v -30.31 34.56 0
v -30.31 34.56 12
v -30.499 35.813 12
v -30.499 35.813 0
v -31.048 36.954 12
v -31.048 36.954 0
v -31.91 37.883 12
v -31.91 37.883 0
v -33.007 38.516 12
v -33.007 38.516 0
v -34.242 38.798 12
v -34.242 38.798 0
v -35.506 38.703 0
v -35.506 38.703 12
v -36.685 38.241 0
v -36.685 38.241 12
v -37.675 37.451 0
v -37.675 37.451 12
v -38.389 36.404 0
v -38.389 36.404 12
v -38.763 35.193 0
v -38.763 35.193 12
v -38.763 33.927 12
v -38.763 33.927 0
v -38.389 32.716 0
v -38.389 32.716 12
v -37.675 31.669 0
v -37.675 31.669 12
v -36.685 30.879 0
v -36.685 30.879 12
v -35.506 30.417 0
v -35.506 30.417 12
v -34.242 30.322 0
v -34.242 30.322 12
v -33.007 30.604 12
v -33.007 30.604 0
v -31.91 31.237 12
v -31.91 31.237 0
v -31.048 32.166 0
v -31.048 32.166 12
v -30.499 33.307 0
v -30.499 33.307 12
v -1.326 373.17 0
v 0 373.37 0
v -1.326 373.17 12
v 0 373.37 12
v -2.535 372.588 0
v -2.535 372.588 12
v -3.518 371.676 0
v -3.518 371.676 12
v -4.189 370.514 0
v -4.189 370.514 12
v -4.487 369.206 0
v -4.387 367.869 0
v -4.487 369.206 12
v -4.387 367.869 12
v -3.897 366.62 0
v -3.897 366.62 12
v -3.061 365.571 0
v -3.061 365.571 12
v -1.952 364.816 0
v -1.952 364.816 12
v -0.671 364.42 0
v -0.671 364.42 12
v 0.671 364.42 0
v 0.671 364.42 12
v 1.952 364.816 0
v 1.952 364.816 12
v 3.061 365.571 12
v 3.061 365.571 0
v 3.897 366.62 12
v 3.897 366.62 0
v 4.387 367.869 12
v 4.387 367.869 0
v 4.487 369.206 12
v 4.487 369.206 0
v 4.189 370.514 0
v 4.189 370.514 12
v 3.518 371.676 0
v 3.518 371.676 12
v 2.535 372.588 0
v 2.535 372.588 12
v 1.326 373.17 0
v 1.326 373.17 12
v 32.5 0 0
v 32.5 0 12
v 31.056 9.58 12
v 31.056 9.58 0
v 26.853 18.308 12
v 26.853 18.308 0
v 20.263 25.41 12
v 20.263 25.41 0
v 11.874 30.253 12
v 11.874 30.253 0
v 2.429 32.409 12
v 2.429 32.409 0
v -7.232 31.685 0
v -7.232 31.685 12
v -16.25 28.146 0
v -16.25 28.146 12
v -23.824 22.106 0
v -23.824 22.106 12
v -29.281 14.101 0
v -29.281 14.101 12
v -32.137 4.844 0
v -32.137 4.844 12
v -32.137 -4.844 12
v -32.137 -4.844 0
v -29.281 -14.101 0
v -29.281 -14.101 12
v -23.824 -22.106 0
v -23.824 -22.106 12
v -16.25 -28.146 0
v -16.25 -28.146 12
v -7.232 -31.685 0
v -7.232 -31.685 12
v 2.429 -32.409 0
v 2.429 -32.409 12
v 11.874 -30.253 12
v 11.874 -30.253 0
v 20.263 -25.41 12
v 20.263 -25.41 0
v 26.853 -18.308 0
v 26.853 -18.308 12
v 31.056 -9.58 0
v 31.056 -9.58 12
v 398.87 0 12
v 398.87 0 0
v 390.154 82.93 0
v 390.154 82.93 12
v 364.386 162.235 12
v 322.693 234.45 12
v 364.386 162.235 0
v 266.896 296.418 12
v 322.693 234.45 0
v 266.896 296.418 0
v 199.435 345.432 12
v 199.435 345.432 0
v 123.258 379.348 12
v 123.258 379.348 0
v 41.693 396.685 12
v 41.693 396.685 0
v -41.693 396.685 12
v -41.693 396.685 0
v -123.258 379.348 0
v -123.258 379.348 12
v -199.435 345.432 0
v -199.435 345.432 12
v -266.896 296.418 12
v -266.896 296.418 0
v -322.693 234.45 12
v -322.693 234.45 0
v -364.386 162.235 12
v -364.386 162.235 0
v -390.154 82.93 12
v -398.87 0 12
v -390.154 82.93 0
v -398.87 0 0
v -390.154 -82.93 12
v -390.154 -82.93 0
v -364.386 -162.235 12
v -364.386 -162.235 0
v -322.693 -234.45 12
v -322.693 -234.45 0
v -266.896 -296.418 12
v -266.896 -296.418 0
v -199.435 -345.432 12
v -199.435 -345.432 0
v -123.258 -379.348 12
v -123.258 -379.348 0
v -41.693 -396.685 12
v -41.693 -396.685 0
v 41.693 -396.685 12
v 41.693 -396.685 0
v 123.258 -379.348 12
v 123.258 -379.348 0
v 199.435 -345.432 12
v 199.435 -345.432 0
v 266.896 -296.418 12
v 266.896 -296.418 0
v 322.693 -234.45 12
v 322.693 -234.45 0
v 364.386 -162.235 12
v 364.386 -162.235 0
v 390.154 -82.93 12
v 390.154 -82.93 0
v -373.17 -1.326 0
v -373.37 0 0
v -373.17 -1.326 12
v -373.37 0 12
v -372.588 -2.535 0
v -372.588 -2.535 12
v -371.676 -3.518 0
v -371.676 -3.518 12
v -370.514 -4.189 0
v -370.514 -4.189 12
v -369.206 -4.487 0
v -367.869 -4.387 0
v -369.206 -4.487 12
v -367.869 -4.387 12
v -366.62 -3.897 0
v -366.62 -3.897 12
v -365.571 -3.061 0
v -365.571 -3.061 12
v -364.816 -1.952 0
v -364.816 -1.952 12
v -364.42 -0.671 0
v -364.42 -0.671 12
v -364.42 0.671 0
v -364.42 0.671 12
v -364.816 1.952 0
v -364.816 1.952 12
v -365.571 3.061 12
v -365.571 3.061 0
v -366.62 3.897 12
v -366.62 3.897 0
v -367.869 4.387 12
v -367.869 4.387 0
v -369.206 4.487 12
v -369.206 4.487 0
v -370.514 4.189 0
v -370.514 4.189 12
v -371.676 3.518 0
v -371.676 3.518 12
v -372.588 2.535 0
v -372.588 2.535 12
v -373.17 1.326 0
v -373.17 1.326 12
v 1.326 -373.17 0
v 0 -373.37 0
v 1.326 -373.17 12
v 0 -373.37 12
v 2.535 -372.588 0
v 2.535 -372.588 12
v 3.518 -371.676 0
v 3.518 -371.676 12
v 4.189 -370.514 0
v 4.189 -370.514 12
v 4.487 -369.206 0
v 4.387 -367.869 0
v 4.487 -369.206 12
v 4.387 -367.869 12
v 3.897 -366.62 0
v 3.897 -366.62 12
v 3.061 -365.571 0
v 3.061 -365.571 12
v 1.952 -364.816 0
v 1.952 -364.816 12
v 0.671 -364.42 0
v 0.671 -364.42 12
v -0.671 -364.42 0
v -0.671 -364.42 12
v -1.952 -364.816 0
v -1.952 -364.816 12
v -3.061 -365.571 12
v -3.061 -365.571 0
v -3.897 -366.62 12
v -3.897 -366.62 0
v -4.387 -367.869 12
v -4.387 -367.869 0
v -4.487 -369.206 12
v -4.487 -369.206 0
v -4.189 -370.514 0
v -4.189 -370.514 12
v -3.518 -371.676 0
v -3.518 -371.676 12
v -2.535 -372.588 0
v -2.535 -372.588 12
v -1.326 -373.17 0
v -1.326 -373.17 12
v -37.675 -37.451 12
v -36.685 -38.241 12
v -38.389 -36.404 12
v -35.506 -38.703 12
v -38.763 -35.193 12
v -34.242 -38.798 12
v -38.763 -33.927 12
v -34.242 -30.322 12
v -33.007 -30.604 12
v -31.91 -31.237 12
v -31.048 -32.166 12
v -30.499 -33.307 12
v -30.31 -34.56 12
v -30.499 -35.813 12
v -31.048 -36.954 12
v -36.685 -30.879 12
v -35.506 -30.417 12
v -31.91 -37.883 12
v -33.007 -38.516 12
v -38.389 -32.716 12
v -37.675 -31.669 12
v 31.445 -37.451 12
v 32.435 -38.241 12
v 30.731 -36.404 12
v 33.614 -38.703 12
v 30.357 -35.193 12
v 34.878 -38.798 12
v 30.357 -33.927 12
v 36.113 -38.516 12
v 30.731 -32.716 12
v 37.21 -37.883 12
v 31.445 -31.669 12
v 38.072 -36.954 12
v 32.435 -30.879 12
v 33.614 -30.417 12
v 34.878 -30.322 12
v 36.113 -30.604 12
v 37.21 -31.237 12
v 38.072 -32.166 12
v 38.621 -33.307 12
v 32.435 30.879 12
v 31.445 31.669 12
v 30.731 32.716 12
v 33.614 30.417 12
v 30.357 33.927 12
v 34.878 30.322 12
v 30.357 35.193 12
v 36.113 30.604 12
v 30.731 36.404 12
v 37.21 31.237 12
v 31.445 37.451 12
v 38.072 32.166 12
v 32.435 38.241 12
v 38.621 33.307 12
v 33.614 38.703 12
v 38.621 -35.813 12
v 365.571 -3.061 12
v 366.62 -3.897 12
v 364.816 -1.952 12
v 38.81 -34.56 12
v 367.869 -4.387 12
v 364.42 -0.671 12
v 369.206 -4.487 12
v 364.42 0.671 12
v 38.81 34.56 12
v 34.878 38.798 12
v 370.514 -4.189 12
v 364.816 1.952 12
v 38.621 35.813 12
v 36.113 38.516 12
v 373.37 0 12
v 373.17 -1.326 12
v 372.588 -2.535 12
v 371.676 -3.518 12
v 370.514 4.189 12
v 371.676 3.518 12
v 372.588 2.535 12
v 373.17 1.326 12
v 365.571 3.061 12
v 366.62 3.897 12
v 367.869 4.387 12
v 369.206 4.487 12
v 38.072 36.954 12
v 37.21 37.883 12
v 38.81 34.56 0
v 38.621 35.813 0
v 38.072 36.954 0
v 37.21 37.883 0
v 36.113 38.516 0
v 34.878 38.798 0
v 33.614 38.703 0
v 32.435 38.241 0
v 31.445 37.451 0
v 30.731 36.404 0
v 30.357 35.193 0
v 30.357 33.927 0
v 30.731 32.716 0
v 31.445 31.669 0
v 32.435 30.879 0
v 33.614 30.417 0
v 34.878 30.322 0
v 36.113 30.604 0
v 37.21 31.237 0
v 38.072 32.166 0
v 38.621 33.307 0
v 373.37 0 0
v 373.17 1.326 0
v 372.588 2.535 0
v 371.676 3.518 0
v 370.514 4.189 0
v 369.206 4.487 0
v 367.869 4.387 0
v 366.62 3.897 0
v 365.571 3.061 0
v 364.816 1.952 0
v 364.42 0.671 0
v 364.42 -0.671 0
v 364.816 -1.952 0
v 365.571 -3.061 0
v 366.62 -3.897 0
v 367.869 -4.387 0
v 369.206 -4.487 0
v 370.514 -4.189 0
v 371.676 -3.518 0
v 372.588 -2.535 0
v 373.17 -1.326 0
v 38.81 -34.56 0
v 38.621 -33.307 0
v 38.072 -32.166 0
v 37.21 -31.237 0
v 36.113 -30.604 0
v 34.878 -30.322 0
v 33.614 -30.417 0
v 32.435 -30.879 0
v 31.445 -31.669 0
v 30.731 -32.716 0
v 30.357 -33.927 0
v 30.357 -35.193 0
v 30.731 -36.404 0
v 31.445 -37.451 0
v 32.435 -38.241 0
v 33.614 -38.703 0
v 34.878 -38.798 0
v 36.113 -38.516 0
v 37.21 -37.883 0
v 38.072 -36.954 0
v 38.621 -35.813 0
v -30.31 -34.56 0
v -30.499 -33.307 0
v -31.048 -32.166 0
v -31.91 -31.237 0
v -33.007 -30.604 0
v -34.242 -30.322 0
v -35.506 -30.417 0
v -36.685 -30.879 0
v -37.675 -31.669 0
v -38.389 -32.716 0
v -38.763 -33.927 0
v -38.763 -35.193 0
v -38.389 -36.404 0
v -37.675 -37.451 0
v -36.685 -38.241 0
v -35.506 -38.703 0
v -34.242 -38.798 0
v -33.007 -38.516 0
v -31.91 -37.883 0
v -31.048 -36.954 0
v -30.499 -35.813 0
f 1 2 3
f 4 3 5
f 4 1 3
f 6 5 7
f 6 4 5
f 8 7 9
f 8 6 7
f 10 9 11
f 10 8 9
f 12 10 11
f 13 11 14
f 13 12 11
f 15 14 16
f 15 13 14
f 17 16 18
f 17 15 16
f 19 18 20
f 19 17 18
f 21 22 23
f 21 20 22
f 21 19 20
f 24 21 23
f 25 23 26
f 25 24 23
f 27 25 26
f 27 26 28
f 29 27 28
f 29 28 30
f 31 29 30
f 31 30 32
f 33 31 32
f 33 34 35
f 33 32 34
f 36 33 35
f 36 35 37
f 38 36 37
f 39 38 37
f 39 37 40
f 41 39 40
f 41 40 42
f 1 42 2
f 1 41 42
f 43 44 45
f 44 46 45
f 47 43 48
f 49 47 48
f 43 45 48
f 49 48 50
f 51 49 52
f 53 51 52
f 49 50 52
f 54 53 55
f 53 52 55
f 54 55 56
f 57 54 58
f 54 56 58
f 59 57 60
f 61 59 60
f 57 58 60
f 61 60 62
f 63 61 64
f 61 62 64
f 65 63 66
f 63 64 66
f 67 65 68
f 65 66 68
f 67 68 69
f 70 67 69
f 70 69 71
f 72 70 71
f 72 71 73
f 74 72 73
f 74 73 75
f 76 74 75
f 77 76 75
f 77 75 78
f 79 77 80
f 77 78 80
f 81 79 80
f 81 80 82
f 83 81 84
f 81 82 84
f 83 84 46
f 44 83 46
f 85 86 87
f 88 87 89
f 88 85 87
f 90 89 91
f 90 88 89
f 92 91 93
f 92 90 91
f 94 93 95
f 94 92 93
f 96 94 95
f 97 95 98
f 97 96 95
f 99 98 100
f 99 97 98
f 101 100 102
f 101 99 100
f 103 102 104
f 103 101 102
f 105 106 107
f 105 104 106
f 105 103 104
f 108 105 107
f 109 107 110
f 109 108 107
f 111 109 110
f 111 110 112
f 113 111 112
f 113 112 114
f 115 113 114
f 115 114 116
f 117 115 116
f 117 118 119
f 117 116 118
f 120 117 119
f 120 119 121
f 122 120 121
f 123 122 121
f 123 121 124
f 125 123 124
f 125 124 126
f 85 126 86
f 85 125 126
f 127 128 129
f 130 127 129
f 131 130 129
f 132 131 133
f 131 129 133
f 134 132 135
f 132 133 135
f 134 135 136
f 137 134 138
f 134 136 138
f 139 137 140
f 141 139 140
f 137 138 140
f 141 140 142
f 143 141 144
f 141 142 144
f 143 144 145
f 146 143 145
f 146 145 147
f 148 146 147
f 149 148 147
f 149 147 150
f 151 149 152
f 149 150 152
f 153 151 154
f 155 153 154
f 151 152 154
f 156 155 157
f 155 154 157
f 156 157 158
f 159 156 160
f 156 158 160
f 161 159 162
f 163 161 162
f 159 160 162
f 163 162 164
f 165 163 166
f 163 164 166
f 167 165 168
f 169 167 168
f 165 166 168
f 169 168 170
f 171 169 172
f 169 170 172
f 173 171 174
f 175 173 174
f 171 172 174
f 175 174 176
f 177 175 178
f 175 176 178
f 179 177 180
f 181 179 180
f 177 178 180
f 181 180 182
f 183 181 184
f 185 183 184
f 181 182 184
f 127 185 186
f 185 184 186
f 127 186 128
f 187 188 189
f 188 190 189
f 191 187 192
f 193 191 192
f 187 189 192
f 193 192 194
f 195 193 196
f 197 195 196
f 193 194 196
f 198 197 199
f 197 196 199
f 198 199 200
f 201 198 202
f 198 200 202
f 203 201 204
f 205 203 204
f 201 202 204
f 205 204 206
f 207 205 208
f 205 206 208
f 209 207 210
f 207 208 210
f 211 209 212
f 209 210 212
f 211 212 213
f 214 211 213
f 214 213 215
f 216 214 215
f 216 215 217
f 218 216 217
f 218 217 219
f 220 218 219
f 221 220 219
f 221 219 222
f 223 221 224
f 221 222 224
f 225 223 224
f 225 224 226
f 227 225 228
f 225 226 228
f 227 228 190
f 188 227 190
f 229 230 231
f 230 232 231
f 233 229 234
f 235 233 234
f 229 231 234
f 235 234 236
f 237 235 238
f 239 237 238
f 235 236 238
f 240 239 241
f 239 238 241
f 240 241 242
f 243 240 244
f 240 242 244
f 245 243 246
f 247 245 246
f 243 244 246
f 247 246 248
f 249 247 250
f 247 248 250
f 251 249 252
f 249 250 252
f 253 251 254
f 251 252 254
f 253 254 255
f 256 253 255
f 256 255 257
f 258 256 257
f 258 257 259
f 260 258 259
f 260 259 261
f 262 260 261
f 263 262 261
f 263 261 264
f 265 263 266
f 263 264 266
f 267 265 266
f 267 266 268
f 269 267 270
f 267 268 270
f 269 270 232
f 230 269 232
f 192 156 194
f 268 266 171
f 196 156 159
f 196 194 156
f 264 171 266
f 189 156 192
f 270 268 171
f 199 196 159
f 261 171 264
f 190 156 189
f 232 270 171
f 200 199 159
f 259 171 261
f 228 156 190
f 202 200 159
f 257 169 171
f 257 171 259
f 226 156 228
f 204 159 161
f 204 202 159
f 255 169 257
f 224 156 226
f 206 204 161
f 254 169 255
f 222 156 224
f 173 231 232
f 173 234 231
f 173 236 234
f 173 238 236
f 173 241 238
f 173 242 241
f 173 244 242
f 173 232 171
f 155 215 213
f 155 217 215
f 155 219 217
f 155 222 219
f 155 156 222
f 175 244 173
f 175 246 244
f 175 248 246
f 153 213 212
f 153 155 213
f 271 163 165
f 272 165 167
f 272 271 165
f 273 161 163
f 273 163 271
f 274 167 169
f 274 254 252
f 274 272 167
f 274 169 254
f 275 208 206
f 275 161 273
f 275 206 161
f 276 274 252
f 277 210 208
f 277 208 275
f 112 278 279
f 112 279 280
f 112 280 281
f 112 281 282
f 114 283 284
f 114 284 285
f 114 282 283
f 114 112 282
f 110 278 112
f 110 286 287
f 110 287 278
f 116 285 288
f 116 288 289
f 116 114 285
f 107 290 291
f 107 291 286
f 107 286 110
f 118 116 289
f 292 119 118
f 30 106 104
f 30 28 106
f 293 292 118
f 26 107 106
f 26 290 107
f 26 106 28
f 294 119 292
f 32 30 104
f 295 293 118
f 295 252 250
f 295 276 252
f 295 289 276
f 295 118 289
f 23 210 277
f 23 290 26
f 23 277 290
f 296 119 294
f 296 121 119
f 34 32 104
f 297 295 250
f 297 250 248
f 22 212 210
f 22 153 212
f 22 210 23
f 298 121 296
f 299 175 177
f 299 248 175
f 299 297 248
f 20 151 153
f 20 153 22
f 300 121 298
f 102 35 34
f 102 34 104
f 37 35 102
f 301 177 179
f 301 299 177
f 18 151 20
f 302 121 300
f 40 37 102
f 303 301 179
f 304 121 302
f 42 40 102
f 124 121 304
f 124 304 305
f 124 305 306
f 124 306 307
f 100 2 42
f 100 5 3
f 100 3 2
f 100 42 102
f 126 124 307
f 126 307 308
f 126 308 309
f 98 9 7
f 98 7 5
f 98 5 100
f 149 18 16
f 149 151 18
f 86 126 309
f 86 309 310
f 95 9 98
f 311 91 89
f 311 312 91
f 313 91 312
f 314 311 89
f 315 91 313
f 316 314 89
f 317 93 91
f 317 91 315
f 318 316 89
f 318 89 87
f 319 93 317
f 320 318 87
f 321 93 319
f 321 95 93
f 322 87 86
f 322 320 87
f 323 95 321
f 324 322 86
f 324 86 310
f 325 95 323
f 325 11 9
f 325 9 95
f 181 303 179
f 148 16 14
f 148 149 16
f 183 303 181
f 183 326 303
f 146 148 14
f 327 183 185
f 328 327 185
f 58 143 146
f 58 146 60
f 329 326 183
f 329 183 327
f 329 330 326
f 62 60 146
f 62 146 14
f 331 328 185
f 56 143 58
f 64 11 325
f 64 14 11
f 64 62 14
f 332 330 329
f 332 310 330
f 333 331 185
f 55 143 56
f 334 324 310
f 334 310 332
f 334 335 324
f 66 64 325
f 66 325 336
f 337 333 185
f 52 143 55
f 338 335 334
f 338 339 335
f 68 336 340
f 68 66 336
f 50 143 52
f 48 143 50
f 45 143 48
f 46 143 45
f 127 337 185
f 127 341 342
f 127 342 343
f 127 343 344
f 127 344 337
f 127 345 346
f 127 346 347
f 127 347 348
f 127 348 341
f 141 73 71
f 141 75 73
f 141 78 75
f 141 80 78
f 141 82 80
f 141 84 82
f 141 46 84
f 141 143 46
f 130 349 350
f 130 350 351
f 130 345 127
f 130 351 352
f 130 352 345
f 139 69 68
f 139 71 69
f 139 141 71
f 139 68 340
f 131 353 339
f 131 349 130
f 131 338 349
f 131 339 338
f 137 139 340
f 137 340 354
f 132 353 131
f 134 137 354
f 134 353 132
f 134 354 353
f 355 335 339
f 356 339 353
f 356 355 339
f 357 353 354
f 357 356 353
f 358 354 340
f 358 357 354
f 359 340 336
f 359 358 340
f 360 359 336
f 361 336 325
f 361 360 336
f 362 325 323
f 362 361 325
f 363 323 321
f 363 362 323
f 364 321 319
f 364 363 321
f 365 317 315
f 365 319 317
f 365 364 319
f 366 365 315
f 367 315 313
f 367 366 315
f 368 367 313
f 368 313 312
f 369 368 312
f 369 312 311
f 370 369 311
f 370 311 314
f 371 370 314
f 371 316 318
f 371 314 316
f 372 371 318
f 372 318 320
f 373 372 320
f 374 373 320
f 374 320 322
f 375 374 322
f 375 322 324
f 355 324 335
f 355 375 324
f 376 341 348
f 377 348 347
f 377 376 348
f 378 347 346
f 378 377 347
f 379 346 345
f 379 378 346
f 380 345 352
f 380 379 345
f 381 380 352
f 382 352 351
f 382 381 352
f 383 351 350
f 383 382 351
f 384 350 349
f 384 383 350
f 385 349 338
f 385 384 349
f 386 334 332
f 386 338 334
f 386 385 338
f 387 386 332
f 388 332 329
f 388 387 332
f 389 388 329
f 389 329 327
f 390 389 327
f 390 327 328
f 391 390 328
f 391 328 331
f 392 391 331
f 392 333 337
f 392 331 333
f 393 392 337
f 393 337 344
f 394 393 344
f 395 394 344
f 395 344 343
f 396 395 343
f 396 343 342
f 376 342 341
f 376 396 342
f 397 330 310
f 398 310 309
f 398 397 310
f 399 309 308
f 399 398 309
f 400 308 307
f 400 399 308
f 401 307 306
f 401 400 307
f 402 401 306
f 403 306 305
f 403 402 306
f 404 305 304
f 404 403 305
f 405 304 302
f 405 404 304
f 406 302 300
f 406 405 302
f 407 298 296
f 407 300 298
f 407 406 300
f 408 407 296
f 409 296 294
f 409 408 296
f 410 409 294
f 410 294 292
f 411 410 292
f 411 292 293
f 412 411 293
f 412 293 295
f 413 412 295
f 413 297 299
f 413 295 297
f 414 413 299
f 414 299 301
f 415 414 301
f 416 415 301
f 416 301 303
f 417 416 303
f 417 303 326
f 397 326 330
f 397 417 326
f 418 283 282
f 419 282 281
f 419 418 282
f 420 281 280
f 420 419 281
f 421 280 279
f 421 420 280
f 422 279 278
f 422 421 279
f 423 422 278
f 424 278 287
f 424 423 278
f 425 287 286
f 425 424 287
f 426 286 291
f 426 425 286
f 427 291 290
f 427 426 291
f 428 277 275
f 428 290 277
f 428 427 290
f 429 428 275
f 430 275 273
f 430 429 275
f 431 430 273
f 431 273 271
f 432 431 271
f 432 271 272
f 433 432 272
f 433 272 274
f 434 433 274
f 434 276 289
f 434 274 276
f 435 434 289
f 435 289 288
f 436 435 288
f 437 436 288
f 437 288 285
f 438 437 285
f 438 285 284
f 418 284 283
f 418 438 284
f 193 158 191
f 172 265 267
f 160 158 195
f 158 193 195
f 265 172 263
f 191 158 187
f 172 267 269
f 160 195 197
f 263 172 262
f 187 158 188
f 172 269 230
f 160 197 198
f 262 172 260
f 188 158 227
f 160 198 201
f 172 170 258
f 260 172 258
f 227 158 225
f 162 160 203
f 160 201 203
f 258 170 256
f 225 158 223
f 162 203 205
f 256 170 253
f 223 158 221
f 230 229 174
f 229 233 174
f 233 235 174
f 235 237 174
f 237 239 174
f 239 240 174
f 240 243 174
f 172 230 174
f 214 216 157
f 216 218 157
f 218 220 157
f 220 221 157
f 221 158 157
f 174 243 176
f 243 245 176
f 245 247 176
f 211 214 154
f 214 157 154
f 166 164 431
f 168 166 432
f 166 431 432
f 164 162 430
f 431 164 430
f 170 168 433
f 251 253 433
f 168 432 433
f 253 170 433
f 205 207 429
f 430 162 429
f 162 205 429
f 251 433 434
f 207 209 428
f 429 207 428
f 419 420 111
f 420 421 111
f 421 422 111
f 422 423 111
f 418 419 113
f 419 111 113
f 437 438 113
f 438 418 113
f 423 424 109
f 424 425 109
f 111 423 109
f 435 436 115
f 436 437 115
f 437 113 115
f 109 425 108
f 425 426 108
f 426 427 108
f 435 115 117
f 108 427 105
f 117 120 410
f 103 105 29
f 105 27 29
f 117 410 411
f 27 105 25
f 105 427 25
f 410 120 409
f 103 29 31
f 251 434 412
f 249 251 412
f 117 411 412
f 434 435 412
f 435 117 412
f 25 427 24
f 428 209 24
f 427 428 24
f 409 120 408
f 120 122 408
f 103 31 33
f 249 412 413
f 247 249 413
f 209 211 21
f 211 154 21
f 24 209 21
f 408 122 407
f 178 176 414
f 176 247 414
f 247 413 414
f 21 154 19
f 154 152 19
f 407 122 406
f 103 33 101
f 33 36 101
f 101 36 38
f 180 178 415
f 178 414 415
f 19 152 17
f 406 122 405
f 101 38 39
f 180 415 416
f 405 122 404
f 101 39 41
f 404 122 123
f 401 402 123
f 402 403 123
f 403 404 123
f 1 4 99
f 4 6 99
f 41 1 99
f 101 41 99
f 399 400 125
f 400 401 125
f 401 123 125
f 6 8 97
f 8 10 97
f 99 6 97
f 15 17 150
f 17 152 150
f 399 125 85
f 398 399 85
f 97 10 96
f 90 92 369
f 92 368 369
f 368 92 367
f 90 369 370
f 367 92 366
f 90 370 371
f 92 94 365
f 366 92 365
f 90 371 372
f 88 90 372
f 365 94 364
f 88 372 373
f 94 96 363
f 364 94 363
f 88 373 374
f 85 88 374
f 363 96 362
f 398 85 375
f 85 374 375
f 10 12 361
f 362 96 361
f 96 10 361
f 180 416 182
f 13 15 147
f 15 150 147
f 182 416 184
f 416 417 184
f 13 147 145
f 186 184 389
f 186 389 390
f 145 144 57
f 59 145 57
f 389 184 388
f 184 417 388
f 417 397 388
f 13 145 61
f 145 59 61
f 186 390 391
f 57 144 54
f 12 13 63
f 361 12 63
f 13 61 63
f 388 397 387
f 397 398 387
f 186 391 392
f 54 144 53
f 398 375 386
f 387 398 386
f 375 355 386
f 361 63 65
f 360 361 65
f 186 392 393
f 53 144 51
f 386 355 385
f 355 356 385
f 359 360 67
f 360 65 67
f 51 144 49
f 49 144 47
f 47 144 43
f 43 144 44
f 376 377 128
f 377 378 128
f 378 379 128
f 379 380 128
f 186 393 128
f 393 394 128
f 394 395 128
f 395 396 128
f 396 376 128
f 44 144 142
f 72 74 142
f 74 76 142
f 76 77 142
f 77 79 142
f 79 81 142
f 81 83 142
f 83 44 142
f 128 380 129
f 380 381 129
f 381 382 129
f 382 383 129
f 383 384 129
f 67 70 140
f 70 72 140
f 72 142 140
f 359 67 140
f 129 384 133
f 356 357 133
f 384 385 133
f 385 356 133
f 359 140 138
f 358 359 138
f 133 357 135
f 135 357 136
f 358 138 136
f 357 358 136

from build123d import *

# Parameters (mm, degrees)
SKETCH089_R           = 398.87
PAD013_DEPTH          = 12
SKETCH090_R           = 4.25
POCKET056_DEPTH       = 0.001
POCKET056_DEPTH_BACK  = 12.001
SKETCH091_R           = 32.5
POCKET057_DEPTH       = 0.001
POCKET057_DEPTH_BACK  = 12.001
SKETCH092_R           = 4.5
POCKET058_DEPTH       = 2256.478091
POCKET058_DEPTH_BACK  = 2268.478091
POLARPATTERN016_COUNT = 4


with BuildPart() as part:
    # Sketch089 → Pad013 (new body)
    with BuildSketch(Plane.XY):
        Circle(SKETCH089_R)
    extrude(amount=PAD013_DEPTH)

    # Sketch090 → Pocket056 (cut, two sides)
    with BuildSketch(Plane.XY) as pocket056_sk:
        with Locations((34.56, 34.56)):
            Circle(SKETCH090_R)
        with Locations((-34.56, 34.56)):
            Circle(SKETCH090_R)
        with Locations((-34.56, -34.56)):
            Circle(SKETCH090_R)
        with Locations((34.56, -34.56)):
            Circle(SKETCH090_R)
    extrude(amount=-POCKET056_DEPTH, mode=Mode.SUBTRACT)
    extrude(pocket056_sk.sketch, amount=POCKET056_DEPTH_BACK, mode=Mode.SUBTRACT)

    # Sketch091 → Pocket057 (cut, two sides)
    with BuildSketch(Plane.XY) as pocket057_sk:
        Circle(SKETCH091_R)
    extrude(amount=-POCKET057_DEPTH, mode=Mode.SUBTRACT)
    extrude(pocket057_sk.sketch, amount=POCKET057_DEPTH_BACK, mode=Mode.SUBTRACT)

    # Sketch092 → Pocket058 (cut, two sides)
    with BuildSketch(Plane(origin=(368.87, 0, 0), x_dir=(1, 0, 0), z_dir=(0, 0, 1))) as pocket058_sk:
        Circle(SKETCH092_R)
    pocket058 = extrude(amount=-POCKET058_DEPTH, mode=Mode.SUBTRACT) + extrude(pocket058_sk.sketch, amount=POCKET058_DEPTH_BACK, mode=Mode.SUBTRACT)

    # PolarPattern016: Pocket058 ×4 about axis
    polarpattern016_axis = Axis((0, 0, 0), (0, 0, 1))
    for i in range(1, POLARPATTERN016_COUNT):
        add(pocket058.rotate(polarpattern016_axis, i * 360 / POLARPATTERN016_COUNT), mode=Mode.SUBTRACT)


solid = part.part
